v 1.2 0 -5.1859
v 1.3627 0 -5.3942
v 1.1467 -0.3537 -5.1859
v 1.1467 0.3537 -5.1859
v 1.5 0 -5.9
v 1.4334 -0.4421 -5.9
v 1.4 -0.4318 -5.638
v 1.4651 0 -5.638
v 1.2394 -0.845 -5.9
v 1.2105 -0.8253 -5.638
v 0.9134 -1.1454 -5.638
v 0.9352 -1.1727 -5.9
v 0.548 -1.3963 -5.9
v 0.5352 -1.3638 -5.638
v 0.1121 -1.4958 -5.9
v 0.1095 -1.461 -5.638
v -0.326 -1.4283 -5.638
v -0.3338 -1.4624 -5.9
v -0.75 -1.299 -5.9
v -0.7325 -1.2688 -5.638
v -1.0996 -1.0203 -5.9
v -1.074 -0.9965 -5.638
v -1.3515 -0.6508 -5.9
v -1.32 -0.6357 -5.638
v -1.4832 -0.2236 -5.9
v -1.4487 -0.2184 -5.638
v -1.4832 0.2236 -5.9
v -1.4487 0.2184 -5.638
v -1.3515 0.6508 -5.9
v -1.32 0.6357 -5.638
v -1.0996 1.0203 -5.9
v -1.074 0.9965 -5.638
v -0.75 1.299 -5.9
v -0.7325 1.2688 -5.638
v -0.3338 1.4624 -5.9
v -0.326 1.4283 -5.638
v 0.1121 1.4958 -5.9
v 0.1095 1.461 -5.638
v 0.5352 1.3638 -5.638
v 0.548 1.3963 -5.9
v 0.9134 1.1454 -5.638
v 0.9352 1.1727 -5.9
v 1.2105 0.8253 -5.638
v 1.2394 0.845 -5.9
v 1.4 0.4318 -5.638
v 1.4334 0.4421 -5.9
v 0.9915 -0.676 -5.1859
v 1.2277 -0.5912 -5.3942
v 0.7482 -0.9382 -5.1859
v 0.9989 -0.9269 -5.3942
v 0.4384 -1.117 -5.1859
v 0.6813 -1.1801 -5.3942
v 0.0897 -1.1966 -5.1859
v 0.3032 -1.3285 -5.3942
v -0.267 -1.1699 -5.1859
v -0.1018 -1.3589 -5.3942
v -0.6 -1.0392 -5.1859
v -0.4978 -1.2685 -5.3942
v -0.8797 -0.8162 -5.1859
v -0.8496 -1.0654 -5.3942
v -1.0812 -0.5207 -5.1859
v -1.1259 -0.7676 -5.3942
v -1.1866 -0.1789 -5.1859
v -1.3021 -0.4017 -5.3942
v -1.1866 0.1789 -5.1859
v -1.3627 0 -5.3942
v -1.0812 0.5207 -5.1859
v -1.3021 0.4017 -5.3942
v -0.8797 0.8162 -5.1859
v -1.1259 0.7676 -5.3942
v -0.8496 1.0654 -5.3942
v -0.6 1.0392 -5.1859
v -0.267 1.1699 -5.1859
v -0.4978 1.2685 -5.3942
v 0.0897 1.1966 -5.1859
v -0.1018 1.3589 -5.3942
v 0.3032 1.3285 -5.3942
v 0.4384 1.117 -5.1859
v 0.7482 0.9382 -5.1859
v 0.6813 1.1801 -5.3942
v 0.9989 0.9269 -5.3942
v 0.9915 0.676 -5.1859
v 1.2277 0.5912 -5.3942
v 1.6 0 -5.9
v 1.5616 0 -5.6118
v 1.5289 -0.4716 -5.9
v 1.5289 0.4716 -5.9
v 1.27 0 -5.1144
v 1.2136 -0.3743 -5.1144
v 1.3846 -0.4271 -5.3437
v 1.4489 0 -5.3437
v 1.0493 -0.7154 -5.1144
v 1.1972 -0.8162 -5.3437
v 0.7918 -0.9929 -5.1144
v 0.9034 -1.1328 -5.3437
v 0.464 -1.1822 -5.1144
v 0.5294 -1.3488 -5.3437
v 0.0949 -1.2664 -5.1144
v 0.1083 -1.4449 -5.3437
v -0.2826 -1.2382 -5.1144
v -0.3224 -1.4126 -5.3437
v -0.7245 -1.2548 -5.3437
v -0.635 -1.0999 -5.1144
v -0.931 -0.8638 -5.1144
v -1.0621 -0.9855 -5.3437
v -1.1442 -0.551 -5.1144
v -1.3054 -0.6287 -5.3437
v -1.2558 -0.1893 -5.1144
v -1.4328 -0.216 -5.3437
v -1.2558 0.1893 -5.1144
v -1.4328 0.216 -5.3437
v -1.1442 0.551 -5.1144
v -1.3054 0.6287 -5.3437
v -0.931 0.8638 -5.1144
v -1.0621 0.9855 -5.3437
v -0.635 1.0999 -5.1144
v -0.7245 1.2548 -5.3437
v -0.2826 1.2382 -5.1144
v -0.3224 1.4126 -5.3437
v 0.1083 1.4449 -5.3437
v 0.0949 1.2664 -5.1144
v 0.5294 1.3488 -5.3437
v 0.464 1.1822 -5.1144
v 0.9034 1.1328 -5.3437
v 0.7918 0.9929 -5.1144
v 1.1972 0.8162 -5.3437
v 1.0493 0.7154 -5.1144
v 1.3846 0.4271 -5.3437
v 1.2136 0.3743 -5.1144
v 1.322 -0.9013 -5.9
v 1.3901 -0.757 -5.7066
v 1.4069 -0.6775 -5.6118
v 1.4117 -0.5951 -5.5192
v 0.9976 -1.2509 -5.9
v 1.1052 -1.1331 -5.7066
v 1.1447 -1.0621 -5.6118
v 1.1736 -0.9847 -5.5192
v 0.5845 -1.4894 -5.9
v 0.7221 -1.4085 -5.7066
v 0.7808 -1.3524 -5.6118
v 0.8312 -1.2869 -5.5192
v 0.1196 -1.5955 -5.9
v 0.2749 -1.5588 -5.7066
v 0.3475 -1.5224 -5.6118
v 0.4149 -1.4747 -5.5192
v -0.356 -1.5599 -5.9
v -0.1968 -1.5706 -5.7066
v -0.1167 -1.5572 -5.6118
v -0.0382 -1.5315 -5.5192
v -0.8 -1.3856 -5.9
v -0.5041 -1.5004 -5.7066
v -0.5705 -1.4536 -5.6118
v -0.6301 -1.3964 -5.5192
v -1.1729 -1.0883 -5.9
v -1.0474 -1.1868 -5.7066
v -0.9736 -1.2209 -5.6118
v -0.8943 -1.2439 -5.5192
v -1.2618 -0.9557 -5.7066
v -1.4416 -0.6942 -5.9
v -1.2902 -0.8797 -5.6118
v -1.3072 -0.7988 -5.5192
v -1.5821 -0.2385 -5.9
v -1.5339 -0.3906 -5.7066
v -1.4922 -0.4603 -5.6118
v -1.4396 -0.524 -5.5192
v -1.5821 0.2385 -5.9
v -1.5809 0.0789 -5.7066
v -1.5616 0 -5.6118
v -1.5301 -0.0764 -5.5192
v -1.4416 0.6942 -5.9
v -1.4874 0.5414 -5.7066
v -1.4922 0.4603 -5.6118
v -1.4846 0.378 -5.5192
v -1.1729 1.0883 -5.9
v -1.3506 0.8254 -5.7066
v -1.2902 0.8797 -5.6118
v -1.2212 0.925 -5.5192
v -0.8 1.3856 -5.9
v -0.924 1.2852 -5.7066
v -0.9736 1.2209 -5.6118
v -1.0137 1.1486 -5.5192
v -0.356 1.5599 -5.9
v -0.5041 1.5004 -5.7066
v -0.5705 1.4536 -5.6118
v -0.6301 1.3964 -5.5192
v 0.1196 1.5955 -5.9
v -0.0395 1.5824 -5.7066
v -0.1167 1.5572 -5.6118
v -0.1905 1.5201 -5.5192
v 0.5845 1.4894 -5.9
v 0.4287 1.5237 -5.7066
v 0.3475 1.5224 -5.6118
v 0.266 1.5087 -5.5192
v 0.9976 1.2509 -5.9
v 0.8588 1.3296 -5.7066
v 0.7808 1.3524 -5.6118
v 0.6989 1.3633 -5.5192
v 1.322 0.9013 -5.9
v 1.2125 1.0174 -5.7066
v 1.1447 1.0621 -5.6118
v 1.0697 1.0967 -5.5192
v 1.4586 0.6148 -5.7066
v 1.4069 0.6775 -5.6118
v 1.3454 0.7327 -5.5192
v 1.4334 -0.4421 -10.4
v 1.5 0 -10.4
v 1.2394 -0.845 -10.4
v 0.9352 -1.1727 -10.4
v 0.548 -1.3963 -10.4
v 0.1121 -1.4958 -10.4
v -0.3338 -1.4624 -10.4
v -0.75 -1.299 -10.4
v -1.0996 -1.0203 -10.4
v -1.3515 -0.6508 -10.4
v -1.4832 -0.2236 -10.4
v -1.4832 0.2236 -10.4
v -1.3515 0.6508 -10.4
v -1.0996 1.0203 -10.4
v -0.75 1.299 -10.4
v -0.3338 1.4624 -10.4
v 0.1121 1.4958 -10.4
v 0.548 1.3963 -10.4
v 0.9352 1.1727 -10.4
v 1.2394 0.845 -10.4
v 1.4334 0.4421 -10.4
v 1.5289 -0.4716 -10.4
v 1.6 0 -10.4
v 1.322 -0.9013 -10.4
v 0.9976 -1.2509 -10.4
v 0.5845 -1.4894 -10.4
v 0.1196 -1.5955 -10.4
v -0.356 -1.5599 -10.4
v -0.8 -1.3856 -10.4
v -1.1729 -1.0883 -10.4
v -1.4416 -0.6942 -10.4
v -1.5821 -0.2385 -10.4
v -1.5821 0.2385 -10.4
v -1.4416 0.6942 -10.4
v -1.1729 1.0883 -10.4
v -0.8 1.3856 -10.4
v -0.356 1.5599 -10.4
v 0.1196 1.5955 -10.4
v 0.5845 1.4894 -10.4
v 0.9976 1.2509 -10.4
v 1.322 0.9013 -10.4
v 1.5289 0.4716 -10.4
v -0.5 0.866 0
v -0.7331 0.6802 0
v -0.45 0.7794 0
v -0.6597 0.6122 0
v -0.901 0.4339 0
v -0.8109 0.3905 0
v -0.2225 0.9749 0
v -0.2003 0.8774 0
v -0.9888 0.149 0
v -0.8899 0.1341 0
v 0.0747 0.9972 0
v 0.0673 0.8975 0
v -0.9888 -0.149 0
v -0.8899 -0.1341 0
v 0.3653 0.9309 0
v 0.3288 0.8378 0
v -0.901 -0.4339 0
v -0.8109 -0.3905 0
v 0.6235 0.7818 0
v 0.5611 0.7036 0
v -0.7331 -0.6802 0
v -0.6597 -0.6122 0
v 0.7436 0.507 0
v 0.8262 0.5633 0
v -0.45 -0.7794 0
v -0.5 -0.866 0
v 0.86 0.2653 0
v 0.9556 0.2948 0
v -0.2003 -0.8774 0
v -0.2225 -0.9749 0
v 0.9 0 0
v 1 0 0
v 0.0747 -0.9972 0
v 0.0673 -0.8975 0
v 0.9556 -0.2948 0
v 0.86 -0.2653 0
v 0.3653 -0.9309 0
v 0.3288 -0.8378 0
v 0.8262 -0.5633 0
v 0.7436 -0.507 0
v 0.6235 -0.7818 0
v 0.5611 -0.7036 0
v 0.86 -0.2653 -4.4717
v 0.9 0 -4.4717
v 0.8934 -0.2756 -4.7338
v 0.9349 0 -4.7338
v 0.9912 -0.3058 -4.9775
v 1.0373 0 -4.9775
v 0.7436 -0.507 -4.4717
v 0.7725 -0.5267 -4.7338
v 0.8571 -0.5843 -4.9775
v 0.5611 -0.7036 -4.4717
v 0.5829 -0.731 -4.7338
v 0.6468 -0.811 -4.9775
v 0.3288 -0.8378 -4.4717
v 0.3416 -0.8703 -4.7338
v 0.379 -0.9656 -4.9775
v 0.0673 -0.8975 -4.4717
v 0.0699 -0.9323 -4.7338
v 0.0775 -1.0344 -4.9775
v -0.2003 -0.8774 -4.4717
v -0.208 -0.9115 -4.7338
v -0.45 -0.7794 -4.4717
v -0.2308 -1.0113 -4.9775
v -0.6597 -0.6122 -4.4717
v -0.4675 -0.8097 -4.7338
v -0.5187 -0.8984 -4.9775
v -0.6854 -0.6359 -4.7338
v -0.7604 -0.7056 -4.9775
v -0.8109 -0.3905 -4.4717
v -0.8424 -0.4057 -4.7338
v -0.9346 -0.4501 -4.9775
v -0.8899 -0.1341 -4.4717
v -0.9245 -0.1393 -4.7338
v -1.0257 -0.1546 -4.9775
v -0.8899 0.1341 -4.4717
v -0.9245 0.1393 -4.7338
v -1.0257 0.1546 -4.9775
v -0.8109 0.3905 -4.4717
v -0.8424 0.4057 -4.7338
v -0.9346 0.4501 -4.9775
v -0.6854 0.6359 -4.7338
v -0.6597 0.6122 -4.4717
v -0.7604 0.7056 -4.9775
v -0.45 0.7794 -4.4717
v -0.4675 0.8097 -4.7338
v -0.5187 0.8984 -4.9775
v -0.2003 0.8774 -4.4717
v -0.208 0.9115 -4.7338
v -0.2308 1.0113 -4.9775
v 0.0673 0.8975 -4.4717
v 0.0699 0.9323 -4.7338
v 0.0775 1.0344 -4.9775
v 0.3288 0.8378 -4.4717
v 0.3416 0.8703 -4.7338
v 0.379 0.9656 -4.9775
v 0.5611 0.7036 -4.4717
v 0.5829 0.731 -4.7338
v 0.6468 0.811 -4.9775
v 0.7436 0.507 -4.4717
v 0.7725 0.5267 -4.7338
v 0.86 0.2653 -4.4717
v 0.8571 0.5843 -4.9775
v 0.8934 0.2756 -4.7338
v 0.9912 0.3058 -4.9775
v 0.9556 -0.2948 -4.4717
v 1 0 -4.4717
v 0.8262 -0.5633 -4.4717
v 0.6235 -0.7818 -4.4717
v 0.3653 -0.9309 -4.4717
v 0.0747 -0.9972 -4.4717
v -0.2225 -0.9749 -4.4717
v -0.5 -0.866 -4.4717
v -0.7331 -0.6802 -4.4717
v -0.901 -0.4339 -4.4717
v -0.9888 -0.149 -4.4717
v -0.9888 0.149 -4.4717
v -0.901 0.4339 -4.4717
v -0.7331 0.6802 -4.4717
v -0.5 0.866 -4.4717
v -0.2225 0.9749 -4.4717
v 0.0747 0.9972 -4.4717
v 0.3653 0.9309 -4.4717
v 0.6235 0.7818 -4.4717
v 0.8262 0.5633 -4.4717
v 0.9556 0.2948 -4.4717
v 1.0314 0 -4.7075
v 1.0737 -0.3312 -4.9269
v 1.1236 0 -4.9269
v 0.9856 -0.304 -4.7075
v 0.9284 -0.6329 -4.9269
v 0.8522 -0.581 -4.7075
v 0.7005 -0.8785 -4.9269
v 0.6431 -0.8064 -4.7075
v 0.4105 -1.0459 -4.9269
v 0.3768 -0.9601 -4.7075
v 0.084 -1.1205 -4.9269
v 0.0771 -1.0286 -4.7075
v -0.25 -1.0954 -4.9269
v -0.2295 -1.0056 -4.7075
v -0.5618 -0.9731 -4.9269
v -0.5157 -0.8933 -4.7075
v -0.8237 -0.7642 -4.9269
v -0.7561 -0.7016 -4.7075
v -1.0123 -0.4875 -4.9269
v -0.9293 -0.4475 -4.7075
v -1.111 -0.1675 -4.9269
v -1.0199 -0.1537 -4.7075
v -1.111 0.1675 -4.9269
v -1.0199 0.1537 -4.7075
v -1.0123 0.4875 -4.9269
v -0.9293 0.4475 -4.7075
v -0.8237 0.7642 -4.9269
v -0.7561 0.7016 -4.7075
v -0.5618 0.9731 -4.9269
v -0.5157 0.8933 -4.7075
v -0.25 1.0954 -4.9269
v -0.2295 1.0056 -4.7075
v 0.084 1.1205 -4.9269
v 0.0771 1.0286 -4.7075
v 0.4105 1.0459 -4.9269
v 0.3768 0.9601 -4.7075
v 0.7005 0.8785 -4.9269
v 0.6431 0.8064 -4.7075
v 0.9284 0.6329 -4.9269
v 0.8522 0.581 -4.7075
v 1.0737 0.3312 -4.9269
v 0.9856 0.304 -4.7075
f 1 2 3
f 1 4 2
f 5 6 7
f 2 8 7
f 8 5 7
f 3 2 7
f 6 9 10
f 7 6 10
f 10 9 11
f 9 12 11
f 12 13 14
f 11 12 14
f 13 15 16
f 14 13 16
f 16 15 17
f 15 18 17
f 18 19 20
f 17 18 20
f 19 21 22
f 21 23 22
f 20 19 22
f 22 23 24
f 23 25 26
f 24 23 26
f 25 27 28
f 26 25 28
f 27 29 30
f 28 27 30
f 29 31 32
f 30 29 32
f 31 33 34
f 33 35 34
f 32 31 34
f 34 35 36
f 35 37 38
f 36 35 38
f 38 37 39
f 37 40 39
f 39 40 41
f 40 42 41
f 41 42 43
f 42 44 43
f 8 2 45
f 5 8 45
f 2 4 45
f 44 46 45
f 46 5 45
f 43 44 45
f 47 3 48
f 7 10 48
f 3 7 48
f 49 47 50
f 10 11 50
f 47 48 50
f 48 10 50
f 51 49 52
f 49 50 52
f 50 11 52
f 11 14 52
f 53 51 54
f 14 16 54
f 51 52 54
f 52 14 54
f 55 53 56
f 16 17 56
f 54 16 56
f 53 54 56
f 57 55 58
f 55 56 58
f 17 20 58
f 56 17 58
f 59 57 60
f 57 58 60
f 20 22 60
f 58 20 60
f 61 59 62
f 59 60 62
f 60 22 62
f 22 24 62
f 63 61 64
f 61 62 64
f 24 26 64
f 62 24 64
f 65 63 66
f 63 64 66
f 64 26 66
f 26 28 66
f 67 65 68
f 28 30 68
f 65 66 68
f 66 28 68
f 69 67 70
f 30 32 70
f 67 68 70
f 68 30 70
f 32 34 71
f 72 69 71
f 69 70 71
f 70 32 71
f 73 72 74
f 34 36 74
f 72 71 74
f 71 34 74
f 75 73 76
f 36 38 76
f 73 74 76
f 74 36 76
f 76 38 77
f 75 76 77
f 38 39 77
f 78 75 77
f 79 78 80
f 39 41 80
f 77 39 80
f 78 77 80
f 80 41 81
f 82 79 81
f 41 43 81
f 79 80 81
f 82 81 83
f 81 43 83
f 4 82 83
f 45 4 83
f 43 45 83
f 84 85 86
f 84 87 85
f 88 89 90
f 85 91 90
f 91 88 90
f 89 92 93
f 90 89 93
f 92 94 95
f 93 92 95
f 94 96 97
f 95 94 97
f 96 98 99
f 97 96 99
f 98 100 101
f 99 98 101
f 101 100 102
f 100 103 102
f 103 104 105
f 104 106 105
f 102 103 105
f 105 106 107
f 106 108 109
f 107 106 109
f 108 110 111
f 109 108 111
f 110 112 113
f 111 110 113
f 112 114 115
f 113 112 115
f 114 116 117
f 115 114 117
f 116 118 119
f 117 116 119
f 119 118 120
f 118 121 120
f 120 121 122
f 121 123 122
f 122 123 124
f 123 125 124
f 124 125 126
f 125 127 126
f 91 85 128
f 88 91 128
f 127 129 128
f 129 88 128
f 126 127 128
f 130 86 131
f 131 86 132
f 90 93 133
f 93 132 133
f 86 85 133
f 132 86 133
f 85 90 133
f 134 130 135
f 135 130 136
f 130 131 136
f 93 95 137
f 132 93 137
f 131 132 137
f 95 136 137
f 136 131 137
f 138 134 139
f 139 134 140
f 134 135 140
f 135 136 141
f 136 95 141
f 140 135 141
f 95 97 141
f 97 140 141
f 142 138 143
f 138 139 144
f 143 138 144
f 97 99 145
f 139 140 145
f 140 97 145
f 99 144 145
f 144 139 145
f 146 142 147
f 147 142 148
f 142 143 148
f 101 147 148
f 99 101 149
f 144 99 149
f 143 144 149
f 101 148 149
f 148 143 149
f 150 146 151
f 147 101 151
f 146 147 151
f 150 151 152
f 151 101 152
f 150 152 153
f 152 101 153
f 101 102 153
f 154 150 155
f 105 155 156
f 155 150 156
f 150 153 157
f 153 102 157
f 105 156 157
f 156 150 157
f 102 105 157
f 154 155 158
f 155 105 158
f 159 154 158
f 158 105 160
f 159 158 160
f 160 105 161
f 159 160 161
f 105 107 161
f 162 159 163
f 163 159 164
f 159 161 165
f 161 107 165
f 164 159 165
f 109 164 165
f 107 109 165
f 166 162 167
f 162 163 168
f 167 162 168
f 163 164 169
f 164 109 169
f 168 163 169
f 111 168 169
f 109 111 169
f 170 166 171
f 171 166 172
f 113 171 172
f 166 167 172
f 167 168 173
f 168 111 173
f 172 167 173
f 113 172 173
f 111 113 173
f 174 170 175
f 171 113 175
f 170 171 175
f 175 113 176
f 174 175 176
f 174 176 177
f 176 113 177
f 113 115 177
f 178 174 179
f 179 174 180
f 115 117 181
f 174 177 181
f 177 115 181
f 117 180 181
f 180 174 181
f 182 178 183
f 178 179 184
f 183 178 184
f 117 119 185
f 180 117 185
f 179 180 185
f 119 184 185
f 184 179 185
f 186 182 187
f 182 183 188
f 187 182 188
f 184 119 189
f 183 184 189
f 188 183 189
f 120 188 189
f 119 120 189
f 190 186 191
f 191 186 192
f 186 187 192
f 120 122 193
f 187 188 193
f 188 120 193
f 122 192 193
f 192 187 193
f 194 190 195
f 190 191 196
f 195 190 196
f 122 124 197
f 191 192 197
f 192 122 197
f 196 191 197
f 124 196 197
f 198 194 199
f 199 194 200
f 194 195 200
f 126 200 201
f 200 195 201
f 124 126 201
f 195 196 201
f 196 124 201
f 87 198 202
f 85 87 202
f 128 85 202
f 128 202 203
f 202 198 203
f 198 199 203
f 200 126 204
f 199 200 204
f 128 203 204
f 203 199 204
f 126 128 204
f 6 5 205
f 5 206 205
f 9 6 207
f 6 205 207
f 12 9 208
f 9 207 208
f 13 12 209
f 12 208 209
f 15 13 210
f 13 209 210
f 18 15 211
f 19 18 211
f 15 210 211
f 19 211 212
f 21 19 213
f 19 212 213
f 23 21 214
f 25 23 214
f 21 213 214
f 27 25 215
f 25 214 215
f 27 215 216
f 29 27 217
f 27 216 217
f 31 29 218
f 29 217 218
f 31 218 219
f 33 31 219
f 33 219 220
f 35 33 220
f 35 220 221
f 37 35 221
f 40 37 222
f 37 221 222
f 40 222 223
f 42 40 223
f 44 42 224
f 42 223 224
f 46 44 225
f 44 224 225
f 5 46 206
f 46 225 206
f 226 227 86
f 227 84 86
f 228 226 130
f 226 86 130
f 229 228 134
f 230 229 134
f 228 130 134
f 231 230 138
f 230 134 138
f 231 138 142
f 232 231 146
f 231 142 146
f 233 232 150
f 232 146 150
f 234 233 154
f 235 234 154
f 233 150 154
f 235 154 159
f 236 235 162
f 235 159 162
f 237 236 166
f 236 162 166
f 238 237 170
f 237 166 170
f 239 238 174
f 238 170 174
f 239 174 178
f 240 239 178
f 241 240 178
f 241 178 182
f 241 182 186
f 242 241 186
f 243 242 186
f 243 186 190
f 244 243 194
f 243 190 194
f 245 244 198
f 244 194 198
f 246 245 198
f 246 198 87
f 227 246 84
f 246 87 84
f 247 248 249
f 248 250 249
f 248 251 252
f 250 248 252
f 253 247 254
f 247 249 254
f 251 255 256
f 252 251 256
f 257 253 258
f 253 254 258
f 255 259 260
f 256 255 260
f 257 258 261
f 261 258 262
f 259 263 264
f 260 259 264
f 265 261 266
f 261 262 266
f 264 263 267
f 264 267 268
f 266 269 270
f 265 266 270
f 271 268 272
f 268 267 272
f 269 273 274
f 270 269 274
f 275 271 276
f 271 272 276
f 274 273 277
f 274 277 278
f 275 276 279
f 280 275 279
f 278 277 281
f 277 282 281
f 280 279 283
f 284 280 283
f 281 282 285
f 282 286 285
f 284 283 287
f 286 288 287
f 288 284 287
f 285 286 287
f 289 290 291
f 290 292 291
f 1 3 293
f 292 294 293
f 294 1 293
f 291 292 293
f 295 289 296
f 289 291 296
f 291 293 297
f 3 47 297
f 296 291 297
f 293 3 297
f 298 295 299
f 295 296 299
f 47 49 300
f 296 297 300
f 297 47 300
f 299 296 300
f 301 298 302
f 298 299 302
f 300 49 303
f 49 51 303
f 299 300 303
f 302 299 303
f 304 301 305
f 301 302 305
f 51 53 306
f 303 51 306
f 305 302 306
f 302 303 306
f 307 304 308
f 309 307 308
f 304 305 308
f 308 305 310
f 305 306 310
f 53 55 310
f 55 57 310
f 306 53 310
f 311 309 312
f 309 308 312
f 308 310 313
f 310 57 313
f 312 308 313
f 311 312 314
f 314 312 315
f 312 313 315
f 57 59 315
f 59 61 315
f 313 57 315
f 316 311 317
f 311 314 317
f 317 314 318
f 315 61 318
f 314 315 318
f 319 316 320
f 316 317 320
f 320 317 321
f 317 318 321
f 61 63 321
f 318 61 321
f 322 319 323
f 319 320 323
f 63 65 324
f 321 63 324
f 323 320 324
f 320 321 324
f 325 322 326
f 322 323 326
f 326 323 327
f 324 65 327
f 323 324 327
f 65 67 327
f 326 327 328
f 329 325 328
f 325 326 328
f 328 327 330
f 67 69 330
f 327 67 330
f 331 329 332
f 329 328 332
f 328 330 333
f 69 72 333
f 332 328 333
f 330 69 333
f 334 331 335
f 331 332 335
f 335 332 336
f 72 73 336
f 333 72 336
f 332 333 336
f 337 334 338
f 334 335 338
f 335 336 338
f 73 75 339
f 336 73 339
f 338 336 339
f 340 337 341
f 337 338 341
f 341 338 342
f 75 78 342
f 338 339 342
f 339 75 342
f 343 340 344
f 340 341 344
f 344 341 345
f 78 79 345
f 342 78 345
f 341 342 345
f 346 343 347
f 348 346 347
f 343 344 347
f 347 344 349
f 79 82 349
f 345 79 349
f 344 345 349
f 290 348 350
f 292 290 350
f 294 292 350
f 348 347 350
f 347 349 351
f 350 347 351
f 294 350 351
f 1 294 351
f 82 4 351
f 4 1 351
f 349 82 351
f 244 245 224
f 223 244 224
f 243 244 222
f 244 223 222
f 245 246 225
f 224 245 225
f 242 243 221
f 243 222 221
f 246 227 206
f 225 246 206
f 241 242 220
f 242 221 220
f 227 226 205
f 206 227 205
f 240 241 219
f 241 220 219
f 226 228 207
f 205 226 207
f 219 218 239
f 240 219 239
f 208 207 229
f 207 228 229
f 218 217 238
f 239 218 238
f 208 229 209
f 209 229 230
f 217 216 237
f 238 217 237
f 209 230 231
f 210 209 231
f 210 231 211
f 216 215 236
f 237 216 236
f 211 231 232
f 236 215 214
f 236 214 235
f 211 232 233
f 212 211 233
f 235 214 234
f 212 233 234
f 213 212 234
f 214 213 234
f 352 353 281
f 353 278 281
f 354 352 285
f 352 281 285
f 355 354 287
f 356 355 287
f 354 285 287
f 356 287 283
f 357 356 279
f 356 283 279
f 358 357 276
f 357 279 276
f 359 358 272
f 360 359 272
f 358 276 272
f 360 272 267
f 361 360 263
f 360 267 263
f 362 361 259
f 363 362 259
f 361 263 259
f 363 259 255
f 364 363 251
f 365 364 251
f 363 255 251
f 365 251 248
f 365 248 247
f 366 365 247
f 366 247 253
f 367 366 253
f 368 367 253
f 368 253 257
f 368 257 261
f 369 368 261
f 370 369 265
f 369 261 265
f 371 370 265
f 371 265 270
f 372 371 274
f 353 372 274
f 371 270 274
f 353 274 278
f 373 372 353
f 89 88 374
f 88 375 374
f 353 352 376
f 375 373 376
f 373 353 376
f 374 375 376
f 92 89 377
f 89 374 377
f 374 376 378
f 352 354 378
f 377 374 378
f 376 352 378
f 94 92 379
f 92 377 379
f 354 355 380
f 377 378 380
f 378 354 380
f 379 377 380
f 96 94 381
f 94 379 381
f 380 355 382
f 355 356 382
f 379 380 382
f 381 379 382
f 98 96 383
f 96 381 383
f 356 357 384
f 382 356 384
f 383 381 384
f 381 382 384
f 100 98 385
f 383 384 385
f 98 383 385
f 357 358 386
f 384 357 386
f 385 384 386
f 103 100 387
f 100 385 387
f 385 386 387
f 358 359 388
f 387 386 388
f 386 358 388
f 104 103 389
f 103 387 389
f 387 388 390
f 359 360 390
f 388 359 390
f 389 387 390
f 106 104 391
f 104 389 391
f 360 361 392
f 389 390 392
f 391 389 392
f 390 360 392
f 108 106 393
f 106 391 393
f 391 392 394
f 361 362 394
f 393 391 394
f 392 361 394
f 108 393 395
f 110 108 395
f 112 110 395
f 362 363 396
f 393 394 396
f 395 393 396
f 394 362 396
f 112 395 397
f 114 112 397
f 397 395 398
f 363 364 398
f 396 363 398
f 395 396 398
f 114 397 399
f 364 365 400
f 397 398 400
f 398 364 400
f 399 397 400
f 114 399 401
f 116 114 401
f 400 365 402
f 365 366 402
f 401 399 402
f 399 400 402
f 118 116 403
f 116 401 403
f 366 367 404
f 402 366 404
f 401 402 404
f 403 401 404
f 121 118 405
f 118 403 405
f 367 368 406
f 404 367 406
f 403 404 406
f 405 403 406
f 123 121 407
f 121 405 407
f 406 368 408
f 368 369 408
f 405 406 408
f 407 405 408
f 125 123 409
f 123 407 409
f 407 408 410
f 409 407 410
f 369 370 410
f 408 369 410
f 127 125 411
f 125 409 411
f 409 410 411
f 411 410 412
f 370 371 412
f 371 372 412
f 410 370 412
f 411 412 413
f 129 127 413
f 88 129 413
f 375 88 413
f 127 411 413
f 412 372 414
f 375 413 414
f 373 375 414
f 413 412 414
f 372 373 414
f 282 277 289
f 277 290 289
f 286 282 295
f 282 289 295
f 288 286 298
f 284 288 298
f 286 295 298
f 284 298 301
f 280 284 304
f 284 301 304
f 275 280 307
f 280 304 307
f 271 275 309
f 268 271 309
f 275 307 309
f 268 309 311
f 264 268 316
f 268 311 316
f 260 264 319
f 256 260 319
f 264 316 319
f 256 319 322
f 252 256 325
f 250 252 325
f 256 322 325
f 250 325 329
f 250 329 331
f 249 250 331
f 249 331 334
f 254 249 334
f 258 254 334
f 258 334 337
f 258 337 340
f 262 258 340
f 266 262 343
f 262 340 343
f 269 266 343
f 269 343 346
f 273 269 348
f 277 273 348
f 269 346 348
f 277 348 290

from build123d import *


with BuildPart() as part:
    # Sketch1 → Revolve-Thin1 (revolve)
    with BuildSketch(Plane(origin=(0, 0, 0), x_dir=(0, 0, -1), z_dir=(1, 0, 0)), mode=Mode.PRIVATE) as revolve_thin1_sk:
        with BuildLine():
            Line((0, 0.9), (4.471714314, 0.9))
            ThreePointArc((4.471714314, 0.9), (4.859012649, 0.978045554), (5.185857157, 1.2))
            ThreePointArc((5.185857157, 1.2), (5.512701665, 1.421954446), (5.9, 1.5))
            Line((5.9, 1.5), (10.4, 1.5))
            Line((10.4, 1.5), (10.4, 1.6))
            Line((10.4, 1.6), (5.9, 1.6))
            ThreePointArc((5.9, 1.6), (5.473971832, 1.51414989), (5.114442873, 1.27))
            ThreePointArc((5.114442873, 1.27), (4.820282815, 1.070240999), (4.471714314, 1))
            Line((4.471714314, 1), (0, 1))
            Line((0, 1), (0, 0.9))
        make_face()
    revolve(revolve_thin1_sk.sketch.rotate(Axis((0, 0, 0), (0, 0, -1)), 90), axis=Axis((0, 0, 0), (0, 0, -1)))


solid = part.part
